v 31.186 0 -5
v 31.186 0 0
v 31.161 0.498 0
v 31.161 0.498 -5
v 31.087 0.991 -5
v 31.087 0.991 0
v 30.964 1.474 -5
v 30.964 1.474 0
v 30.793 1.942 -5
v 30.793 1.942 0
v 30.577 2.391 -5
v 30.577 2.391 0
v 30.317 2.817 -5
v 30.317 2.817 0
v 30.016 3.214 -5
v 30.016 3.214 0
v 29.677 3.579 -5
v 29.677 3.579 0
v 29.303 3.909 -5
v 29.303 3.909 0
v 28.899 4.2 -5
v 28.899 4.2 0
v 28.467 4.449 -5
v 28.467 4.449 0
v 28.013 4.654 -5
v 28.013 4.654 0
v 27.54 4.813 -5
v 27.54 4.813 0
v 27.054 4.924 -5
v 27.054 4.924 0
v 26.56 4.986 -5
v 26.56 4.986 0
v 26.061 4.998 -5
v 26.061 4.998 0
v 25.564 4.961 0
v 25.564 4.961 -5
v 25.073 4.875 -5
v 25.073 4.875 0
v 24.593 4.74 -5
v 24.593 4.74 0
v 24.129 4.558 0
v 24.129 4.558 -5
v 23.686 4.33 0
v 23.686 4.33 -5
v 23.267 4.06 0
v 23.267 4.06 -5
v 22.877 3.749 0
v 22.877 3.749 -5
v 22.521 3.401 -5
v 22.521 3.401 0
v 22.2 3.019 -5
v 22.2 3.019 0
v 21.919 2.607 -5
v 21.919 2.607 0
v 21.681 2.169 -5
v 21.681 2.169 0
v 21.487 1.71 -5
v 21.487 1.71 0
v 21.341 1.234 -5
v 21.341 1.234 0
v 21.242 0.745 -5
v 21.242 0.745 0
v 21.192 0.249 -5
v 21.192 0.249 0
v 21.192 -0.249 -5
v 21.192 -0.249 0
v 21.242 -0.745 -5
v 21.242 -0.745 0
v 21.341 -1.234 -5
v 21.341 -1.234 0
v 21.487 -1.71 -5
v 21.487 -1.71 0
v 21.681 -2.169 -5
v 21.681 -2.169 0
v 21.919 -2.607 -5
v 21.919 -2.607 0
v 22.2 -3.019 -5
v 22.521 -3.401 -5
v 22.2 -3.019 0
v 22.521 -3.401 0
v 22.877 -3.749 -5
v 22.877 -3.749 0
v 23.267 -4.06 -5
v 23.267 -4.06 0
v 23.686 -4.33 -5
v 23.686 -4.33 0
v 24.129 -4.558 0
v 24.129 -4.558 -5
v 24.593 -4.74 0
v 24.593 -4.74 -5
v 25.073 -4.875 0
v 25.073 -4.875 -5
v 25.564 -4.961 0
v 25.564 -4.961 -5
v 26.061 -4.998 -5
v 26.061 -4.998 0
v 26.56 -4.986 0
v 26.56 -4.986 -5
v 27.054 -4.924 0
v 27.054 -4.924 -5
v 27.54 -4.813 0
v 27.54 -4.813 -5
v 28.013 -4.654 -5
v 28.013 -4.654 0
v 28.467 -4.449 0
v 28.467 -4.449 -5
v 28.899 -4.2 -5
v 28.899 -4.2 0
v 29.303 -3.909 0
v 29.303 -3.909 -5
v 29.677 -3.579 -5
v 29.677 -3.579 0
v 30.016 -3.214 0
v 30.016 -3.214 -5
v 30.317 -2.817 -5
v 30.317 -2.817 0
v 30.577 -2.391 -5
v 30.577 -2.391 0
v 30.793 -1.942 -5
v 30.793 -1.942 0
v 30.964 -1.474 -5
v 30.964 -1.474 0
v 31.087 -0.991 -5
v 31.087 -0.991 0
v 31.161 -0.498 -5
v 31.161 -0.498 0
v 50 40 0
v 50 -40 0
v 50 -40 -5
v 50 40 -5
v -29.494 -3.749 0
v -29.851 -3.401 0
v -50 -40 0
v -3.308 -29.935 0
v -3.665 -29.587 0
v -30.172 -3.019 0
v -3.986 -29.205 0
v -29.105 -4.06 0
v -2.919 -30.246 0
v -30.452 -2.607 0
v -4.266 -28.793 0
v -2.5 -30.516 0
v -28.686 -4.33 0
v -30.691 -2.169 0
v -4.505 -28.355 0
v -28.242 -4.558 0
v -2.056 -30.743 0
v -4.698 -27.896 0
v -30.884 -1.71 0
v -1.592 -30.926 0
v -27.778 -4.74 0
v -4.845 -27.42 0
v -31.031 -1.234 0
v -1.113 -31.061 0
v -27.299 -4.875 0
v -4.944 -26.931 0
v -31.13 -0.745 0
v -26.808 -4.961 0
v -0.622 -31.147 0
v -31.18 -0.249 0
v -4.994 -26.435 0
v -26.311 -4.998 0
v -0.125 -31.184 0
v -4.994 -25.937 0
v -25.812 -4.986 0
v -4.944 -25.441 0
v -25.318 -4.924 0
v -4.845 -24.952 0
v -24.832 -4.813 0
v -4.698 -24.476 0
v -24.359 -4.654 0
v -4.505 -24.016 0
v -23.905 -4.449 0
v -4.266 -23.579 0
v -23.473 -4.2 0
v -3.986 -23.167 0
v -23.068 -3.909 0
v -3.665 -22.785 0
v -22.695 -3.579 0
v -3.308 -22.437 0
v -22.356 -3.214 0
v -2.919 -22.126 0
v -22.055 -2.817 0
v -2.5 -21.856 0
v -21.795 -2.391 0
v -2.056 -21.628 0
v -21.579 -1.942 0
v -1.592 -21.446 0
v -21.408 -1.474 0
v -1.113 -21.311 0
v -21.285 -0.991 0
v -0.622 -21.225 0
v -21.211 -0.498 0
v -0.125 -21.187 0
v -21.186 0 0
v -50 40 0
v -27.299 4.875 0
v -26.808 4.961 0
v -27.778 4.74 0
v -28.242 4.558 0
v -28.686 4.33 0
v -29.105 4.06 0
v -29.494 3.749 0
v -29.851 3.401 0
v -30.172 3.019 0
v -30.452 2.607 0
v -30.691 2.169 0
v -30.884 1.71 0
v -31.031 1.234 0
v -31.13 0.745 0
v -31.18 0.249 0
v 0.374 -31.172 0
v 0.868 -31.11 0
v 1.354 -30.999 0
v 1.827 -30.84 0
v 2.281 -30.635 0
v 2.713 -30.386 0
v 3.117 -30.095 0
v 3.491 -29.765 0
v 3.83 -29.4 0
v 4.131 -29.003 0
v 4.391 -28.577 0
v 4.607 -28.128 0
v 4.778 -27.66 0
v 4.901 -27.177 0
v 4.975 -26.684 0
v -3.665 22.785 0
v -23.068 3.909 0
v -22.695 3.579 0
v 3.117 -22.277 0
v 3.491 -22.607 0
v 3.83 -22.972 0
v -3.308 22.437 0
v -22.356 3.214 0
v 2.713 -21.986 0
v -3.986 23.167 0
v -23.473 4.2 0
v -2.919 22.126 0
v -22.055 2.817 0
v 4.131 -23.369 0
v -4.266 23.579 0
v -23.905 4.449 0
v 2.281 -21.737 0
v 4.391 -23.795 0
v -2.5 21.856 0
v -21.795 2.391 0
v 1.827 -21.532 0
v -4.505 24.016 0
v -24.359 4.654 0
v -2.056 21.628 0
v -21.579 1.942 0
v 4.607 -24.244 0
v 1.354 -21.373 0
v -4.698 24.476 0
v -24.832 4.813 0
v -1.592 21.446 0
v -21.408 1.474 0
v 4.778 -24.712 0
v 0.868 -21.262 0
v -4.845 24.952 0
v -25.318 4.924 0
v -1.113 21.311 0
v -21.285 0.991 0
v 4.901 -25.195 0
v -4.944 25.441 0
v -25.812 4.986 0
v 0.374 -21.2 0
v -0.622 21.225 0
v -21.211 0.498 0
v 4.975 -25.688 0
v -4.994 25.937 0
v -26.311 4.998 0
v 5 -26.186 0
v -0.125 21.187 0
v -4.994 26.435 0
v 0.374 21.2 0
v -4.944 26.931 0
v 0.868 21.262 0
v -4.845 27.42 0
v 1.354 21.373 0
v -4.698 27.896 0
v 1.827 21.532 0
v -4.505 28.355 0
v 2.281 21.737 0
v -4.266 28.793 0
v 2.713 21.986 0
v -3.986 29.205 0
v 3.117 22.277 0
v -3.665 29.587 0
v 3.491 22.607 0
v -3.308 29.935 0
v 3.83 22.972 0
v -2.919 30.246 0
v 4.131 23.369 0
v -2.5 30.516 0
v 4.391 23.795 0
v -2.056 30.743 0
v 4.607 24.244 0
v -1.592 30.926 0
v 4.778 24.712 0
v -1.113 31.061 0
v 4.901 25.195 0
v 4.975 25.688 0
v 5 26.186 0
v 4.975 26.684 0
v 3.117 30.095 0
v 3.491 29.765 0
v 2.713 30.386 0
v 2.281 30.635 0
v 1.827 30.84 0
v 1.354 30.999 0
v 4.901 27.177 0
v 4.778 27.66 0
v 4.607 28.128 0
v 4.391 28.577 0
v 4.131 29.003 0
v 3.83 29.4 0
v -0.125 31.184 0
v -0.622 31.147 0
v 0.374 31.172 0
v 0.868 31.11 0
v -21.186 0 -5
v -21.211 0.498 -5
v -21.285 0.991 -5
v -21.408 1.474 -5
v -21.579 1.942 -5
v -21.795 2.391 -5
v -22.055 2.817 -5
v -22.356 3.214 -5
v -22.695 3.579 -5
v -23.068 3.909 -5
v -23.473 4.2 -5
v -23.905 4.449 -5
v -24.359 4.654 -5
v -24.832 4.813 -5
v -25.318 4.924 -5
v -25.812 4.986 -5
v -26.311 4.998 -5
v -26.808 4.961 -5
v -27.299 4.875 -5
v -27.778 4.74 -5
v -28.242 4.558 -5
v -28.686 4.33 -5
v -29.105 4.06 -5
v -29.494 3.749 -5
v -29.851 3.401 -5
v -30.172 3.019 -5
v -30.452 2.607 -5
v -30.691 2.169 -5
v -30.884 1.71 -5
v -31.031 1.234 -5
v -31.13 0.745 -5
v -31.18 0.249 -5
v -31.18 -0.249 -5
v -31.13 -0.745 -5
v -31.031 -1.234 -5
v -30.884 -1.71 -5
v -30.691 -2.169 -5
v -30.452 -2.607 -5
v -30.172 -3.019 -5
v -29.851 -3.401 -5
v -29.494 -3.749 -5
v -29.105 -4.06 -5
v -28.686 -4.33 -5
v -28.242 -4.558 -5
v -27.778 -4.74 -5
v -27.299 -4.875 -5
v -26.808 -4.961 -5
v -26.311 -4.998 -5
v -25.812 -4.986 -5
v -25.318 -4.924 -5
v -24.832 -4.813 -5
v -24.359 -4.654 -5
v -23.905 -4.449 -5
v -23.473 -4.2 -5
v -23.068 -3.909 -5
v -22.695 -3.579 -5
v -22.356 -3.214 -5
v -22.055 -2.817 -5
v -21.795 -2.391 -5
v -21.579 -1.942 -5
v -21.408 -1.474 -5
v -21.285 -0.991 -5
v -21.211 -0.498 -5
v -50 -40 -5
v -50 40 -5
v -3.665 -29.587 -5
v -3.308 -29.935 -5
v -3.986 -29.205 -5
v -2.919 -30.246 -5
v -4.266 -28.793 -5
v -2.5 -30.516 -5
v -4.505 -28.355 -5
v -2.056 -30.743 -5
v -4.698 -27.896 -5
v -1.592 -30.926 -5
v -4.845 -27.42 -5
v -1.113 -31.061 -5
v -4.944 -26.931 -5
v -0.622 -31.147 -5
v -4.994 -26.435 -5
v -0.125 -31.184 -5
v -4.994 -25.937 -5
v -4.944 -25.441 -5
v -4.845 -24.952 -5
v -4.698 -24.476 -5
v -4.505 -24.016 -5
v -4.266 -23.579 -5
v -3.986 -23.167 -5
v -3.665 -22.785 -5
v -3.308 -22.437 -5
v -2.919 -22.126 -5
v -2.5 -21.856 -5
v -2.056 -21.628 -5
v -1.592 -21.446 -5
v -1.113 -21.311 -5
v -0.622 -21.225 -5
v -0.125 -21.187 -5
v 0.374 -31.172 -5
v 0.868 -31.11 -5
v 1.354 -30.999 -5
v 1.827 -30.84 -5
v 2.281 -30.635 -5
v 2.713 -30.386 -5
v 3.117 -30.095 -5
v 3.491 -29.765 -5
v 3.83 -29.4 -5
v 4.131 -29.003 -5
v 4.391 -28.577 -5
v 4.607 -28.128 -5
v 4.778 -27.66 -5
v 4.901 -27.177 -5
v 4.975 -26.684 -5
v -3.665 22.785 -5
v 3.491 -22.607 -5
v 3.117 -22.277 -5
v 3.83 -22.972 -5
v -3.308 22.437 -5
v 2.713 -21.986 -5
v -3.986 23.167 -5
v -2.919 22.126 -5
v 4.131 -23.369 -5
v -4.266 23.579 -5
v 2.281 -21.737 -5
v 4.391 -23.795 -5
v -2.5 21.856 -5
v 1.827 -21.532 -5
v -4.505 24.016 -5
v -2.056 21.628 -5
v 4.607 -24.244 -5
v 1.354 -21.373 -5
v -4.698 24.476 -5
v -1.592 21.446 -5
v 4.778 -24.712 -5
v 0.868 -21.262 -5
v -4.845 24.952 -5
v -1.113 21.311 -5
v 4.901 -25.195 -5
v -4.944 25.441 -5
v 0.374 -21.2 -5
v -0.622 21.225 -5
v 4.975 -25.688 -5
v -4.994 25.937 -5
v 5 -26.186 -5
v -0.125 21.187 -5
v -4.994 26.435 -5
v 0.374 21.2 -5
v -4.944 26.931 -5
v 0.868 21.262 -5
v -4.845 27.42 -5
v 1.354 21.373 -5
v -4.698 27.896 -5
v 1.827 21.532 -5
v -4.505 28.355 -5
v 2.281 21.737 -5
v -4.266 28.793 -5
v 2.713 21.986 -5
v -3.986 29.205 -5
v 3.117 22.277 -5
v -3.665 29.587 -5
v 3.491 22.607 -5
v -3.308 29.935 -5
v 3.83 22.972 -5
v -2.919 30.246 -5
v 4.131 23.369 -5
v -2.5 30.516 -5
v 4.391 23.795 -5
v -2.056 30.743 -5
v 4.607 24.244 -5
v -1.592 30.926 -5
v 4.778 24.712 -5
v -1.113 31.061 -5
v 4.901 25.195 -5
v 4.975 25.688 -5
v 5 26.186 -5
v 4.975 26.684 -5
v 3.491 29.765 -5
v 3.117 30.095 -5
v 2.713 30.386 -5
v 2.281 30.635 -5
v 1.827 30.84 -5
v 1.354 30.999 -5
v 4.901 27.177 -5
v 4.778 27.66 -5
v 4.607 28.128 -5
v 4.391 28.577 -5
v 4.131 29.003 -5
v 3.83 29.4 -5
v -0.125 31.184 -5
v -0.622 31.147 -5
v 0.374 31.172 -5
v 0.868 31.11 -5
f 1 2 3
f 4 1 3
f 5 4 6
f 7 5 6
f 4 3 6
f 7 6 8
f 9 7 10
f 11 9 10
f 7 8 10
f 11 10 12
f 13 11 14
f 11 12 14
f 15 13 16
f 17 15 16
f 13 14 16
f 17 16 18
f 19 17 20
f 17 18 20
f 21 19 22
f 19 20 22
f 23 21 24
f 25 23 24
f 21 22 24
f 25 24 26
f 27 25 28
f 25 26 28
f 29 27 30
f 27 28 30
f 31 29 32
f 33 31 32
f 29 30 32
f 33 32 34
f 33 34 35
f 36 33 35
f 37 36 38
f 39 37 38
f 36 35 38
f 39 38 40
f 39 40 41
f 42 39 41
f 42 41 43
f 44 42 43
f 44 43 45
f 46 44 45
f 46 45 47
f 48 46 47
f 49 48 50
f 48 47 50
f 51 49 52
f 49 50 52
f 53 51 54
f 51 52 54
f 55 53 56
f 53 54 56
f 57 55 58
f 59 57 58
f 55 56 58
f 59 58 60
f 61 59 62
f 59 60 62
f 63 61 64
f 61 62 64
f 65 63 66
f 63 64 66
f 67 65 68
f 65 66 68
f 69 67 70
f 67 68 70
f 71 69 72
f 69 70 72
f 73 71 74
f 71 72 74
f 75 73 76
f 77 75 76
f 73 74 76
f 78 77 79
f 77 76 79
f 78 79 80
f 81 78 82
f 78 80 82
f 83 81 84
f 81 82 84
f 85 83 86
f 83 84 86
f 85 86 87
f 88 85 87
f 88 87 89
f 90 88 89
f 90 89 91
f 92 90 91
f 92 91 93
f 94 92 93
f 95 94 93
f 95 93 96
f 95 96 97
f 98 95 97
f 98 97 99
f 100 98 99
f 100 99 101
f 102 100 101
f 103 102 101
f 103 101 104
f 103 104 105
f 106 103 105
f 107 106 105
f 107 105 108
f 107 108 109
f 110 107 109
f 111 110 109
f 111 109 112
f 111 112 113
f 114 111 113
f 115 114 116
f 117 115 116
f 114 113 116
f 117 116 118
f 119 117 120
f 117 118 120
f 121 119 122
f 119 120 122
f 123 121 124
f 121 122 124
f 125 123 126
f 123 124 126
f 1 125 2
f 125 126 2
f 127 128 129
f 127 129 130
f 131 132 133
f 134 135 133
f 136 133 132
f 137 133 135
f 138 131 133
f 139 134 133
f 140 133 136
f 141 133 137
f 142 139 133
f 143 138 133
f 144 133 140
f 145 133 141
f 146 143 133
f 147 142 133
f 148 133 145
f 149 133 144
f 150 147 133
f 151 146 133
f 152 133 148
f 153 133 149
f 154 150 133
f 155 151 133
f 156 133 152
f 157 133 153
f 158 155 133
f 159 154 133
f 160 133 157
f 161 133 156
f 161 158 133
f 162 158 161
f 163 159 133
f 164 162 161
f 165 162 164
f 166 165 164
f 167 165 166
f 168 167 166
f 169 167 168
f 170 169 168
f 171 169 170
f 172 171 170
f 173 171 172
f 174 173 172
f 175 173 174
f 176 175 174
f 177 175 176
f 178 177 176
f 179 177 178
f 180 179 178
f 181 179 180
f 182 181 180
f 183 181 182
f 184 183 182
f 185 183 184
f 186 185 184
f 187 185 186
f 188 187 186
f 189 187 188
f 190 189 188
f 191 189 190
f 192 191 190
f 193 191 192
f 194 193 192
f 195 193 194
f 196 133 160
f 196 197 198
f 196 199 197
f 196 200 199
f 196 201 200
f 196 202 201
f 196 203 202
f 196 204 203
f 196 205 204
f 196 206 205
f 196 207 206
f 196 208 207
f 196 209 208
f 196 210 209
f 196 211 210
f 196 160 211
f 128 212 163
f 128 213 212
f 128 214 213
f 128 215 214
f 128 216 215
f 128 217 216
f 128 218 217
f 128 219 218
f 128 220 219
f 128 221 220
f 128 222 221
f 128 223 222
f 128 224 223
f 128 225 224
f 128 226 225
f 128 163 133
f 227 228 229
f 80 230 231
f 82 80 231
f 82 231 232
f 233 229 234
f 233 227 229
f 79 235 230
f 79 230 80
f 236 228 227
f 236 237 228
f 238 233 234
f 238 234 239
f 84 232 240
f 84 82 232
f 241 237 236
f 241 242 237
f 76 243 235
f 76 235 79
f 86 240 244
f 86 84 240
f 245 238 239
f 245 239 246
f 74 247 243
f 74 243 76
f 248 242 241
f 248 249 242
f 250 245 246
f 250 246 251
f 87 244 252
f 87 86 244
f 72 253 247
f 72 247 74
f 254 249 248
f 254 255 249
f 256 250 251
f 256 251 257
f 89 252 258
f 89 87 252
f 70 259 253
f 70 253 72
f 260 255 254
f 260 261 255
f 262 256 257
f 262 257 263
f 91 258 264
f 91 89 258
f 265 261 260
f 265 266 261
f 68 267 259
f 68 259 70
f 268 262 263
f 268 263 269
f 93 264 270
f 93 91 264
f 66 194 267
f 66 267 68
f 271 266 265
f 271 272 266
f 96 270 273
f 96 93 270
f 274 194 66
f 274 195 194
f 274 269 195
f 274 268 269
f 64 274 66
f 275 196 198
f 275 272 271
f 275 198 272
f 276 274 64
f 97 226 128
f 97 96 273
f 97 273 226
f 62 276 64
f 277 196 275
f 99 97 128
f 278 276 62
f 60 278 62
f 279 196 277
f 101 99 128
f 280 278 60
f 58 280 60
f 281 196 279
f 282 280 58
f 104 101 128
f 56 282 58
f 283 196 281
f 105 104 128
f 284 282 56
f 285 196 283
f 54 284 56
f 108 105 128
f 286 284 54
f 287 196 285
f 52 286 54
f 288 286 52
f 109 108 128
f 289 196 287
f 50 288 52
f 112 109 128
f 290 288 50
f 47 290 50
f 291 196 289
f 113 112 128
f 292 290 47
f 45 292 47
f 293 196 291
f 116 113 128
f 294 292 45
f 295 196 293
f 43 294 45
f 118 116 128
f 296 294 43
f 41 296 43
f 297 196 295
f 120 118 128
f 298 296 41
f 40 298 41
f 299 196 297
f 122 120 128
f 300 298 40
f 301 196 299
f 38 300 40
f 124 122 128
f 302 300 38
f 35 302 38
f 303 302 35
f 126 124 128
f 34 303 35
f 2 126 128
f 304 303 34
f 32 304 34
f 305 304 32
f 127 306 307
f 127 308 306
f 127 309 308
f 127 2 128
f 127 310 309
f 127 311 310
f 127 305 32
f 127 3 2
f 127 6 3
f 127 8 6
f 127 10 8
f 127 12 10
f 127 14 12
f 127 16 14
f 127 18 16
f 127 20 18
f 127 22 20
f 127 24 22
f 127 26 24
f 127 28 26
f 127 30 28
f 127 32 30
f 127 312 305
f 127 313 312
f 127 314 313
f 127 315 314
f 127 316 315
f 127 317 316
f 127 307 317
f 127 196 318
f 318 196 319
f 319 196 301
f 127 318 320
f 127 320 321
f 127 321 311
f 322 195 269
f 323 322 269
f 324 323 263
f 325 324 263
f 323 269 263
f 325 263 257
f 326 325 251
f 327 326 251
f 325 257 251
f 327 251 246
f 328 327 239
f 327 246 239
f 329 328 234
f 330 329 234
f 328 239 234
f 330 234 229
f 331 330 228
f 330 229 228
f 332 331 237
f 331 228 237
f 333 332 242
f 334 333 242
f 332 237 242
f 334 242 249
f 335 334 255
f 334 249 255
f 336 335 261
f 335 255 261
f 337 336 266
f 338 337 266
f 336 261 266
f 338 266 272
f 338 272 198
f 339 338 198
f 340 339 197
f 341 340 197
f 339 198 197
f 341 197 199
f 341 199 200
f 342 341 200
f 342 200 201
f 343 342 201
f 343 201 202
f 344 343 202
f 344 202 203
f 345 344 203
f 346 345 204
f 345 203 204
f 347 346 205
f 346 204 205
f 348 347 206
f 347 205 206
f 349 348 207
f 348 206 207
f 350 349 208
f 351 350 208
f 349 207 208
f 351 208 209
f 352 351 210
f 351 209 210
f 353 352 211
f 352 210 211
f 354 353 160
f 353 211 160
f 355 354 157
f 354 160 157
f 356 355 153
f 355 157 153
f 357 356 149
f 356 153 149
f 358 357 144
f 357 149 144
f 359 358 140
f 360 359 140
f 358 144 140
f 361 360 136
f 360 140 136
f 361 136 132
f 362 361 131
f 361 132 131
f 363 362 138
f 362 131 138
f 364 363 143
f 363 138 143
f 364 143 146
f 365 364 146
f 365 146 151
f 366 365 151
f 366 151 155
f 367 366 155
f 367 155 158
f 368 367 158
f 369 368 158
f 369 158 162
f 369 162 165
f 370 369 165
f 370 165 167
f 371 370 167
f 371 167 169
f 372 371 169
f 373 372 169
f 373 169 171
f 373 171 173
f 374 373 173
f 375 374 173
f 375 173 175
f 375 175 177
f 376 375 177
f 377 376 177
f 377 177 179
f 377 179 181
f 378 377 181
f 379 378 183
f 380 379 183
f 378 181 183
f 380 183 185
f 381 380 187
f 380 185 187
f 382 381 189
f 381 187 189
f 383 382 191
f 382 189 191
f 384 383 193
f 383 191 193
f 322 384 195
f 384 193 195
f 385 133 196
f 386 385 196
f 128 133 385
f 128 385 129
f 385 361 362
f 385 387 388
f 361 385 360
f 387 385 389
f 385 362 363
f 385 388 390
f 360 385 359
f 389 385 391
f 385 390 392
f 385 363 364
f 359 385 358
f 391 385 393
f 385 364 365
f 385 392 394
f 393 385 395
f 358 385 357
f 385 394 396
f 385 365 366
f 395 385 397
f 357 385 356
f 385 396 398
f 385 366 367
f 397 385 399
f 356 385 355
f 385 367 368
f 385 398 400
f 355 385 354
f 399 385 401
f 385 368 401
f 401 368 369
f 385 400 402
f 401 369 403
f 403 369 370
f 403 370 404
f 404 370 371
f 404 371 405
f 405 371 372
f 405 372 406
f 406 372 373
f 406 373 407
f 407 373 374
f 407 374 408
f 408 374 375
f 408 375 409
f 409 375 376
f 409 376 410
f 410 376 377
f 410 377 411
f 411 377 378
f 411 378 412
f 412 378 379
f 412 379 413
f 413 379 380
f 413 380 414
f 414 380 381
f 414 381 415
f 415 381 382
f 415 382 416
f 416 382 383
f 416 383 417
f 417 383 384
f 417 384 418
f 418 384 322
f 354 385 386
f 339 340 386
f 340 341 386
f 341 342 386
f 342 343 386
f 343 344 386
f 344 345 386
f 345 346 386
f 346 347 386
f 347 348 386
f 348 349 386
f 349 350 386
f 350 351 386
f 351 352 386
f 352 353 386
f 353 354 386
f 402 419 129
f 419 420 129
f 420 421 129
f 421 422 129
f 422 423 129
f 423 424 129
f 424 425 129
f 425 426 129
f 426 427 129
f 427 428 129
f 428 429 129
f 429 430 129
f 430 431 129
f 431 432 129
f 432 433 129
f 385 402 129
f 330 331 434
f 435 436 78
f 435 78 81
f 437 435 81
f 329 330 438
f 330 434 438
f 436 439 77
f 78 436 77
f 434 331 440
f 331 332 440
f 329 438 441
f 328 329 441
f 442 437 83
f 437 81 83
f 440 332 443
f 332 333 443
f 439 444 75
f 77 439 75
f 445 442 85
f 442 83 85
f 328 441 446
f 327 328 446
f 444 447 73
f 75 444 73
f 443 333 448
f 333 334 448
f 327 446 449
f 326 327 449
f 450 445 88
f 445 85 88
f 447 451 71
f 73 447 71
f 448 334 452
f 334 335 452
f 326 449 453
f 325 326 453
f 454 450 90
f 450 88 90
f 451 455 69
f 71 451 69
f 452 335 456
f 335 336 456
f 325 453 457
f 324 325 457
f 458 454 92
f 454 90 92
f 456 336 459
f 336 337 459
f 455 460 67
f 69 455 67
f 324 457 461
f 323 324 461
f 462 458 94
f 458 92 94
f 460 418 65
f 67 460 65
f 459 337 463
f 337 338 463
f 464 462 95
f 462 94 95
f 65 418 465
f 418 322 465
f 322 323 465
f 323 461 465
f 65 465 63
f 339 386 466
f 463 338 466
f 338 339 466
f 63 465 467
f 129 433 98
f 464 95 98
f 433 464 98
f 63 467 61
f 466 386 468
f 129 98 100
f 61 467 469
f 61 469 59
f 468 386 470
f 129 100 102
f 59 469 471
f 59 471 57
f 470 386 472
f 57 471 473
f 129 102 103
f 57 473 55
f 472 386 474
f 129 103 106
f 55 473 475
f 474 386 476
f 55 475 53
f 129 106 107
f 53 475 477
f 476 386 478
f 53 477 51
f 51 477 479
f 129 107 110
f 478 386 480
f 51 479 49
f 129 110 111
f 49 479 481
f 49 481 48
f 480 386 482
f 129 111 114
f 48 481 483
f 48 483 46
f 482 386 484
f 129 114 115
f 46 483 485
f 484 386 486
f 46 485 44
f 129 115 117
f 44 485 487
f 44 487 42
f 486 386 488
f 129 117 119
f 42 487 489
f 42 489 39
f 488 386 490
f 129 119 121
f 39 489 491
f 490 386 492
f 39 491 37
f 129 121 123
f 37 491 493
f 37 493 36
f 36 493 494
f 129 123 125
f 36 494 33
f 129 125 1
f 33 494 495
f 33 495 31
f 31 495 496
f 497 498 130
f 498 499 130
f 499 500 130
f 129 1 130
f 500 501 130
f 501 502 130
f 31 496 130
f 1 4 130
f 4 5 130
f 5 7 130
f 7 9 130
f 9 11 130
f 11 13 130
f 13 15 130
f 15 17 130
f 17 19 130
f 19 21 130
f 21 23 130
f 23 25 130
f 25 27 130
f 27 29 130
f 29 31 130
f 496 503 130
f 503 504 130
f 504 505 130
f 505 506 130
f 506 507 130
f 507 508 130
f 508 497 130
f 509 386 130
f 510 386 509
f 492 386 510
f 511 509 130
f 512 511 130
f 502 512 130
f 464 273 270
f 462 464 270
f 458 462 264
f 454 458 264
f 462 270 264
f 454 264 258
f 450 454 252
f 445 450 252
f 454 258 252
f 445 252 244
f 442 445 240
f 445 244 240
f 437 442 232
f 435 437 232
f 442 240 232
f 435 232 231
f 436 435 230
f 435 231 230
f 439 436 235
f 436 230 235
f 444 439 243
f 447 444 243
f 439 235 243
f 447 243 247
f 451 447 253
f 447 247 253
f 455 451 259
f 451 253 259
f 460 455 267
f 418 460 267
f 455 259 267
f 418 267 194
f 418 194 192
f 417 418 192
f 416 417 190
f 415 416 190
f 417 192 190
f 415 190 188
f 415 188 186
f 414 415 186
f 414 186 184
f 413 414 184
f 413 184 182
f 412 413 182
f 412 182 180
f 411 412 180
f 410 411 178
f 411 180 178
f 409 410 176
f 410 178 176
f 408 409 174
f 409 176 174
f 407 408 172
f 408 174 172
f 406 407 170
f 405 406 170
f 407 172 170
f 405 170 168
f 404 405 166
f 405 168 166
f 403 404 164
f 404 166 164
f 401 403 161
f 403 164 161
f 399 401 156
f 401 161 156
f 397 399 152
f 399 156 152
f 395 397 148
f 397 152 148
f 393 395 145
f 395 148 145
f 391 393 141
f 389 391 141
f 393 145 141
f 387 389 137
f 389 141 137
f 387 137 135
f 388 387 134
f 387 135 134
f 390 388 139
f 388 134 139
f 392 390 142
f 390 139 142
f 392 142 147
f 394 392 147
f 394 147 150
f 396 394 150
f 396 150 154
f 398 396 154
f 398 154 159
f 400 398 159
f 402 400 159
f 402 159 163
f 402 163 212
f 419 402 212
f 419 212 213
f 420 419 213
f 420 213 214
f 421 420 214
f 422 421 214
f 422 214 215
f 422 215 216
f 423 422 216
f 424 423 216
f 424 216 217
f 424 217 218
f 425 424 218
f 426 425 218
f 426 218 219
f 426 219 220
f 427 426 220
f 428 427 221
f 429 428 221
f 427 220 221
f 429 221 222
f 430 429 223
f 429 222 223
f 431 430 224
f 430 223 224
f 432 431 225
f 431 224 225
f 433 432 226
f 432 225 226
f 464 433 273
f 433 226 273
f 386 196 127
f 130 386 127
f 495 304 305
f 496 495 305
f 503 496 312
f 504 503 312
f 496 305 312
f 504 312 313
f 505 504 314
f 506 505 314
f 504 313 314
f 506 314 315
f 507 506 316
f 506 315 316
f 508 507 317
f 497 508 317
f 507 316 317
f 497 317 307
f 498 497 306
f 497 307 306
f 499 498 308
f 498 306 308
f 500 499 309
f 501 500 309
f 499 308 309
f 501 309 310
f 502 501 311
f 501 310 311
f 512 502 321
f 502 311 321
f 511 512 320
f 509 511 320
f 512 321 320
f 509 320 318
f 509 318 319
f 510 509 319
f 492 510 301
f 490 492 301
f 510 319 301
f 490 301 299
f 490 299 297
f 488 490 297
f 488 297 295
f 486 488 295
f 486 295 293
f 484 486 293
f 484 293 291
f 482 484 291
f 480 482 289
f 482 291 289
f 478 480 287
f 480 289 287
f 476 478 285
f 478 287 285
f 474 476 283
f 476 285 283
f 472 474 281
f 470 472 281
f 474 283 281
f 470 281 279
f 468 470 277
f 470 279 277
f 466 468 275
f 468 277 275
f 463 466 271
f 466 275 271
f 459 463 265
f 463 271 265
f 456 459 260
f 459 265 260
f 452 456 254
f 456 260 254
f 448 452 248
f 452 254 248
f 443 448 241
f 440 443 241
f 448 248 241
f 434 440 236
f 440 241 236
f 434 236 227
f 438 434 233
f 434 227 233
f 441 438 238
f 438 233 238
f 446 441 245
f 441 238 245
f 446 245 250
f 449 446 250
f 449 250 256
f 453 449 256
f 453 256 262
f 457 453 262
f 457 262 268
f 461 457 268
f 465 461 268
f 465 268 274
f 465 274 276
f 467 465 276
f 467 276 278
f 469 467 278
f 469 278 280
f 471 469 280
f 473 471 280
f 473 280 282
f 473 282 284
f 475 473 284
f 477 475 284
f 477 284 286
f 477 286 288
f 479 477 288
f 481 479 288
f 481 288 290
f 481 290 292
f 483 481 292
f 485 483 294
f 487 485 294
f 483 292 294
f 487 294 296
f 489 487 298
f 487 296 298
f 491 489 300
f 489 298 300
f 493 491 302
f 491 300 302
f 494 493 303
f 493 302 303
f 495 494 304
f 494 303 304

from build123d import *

# Parameters (mm, degrees)
SKETCH1_W           = 100
SKETCH1_H           = 80
SKETCH1_R           = 5
BOSS_EXTRUDE3_DEPTH = 5


with BuildPart() as part:
    # Sketch1 → Boss-Extrude3 (new body)
    with BuildSketch(Plane.XY):
        Rectangle(SKETCH1_W, SKETCH1_H)
        with Locations((-26.18590973, 0)):
            Circle(SKETCH1_R, mode=Mode.SUBTRACT)
        with Locations((0, 26.18590973)):
            Circle(SKETCH1_R, mode=Mode.SUBTRACT)
        with Locations((26.18590973, 0)):
            Circle(SKETCH1_R, mode=Mode.SUBTRACT)
        with Locations((0, -26.18590973)):
            Circle(SKETCH1_R, mode=Mode.SUBTRACT)
    extrude(amount=-BOSS_EXTRUDE3_DEPTH)


solid = part.part
